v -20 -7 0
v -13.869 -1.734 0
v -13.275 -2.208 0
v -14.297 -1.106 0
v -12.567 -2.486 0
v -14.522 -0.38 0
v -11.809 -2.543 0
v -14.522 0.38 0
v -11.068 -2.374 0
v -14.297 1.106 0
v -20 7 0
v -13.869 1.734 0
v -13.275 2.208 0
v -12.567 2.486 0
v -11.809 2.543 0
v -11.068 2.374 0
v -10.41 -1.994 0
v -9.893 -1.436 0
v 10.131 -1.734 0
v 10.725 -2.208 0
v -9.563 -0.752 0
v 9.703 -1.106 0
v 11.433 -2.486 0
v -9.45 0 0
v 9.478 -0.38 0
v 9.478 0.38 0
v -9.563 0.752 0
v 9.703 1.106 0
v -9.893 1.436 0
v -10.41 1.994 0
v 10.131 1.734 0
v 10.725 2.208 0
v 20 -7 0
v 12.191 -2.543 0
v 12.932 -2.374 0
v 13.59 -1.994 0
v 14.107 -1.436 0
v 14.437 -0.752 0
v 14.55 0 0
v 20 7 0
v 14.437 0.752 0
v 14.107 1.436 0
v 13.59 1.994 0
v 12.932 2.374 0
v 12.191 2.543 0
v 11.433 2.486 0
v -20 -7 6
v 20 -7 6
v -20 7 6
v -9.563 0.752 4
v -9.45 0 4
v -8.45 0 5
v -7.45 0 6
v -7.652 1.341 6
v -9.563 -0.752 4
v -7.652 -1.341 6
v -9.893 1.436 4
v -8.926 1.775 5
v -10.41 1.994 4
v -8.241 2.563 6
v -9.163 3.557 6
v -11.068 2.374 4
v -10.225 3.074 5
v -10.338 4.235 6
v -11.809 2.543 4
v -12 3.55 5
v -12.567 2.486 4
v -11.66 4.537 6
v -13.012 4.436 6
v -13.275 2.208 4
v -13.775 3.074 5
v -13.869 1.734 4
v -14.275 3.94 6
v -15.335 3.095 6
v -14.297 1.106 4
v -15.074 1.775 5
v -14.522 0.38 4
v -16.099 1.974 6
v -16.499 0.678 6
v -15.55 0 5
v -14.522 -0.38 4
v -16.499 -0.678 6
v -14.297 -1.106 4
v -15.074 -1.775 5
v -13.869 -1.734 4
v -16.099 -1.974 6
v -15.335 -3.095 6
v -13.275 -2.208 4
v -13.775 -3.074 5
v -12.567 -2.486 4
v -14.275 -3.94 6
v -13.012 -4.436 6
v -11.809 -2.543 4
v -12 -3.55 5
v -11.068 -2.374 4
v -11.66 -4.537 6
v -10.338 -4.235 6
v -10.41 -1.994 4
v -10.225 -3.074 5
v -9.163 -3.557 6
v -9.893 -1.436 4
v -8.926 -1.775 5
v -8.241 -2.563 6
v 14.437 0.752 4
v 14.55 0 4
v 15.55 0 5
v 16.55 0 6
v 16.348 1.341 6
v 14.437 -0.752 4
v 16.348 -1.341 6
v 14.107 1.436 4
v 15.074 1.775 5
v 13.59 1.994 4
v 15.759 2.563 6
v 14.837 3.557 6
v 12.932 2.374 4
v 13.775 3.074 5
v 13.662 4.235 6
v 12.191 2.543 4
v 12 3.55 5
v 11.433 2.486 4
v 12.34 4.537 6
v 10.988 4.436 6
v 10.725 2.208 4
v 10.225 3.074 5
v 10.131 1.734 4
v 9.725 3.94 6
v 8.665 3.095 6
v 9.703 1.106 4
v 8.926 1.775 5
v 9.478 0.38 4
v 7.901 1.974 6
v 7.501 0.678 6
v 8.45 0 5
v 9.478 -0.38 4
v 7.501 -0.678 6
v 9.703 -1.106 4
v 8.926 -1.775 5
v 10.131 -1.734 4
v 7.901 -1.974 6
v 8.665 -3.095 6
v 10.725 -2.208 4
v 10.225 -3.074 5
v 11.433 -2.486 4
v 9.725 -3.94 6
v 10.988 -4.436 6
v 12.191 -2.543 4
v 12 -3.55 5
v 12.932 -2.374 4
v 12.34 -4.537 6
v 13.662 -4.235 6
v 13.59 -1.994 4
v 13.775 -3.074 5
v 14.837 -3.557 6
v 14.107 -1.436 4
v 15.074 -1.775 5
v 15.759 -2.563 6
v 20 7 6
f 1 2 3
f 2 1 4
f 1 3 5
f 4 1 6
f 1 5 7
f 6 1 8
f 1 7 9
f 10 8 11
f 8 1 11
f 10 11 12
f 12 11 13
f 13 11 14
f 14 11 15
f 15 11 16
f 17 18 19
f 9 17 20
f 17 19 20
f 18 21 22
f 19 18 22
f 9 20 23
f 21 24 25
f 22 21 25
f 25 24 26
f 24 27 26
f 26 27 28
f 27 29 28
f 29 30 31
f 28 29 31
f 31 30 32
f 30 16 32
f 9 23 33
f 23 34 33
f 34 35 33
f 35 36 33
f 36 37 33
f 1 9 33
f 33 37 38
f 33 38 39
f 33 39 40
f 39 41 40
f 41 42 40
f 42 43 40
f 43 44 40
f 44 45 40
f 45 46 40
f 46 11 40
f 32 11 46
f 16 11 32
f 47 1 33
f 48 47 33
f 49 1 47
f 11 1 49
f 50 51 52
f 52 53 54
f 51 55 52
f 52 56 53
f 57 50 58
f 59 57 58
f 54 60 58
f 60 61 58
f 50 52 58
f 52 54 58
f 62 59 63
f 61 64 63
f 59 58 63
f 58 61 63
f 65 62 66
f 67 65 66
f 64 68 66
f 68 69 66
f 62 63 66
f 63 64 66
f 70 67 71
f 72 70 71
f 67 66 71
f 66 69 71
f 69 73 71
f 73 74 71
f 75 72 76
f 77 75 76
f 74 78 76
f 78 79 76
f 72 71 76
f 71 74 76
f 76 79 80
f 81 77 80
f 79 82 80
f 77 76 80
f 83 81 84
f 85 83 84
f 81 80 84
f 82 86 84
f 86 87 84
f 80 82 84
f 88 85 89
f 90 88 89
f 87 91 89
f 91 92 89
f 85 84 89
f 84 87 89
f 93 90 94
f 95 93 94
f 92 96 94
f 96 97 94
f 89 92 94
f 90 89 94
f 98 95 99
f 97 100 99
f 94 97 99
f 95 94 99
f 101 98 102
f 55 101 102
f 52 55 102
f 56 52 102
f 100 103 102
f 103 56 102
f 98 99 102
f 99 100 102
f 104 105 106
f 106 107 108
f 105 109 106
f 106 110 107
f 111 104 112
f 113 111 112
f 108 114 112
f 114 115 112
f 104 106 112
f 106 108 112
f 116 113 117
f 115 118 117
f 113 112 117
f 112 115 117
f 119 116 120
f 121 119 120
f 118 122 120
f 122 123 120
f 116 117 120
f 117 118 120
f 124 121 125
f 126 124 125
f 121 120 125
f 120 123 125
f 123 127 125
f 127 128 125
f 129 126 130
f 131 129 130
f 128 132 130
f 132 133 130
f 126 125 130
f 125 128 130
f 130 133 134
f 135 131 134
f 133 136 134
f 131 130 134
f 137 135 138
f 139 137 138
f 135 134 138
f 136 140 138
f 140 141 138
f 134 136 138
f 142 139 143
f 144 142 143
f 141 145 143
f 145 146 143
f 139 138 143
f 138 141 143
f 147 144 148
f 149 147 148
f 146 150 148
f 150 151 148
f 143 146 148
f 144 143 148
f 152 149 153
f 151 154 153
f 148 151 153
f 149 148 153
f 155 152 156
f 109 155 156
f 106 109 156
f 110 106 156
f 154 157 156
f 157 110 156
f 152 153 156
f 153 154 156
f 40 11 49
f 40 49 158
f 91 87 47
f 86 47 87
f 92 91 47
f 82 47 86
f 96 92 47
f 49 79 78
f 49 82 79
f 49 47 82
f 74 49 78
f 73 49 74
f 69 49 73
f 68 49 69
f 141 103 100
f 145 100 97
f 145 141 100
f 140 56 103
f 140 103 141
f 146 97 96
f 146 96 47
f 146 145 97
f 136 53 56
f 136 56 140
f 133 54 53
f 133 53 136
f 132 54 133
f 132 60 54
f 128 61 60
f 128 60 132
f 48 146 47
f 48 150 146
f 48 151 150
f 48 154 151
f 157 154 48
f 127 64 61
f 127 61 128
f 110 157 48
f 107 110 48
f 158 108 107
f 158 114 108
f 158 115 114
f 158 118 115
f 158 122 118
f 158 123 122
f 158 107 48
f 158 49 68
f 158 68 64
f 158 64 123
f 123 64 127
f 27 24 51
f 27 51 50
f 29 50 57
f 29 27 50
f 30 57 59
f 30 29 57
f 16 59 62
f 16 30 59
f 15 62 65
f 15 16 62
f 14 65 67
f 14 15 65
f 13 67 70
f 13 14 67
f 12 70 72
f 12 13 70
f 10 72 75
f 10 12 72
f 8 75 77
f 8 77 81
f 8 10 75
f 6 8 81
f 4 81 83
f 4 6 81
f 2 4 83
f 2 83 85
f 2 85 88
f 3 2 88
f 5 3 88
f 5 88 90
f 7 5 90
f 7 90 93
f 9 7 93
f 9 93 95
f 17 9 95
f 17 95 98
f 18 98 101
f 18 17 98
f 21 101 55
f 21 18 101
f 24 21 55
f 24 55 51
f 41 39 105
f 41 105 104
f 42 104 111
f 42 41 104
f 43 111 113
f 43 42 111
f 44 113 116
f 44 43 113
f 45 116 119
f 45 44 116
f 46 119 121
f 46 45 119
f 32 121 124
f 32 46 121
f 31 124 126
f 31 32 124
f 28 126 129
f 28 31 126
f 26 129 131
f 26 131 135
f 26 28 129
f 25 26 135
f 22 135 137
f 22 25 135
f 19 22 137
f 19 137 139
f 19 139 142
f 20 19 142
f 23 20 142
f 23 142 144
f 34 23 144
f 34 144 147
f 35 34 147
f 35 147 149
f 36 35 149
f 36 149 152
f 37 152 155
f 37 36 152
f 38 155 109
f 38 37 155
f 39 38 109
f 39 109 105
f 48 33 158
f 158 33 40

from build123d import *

# Parameters (mm, degrees)
SKETCH_W     = 40
SKETCH_H     = 14
SKETCH_R     = 2.55
PAD_DEPTH    = 6
CHAMFER_SIZE = 2


with BuildPart() as part:
    # Sketch → Pad (new body)
    with BuildSketch(Plane.XY):
        Rectangle(SKETCH_W, SKETCH_H)
        with Locations((-12, 0)):
            Circle(SKETCH_R, mode=Mode.SUBTRACT)
        with Locations((12, 0)):
            Circle(SKETCH_R, mode=Mode.SUBTRACT)
    extrude(amount=PAD_DEPTH)

    # Chamfer
    chamfer_edges = [part.edges().sort_by_distance(p)[0] for p in [
        (-14.55, 0, 6),
        (9.45, 0, 6),
    ]]
    chamfer(chamfer_edges, length=CHAMFER_SIZE)


solid = part.part
